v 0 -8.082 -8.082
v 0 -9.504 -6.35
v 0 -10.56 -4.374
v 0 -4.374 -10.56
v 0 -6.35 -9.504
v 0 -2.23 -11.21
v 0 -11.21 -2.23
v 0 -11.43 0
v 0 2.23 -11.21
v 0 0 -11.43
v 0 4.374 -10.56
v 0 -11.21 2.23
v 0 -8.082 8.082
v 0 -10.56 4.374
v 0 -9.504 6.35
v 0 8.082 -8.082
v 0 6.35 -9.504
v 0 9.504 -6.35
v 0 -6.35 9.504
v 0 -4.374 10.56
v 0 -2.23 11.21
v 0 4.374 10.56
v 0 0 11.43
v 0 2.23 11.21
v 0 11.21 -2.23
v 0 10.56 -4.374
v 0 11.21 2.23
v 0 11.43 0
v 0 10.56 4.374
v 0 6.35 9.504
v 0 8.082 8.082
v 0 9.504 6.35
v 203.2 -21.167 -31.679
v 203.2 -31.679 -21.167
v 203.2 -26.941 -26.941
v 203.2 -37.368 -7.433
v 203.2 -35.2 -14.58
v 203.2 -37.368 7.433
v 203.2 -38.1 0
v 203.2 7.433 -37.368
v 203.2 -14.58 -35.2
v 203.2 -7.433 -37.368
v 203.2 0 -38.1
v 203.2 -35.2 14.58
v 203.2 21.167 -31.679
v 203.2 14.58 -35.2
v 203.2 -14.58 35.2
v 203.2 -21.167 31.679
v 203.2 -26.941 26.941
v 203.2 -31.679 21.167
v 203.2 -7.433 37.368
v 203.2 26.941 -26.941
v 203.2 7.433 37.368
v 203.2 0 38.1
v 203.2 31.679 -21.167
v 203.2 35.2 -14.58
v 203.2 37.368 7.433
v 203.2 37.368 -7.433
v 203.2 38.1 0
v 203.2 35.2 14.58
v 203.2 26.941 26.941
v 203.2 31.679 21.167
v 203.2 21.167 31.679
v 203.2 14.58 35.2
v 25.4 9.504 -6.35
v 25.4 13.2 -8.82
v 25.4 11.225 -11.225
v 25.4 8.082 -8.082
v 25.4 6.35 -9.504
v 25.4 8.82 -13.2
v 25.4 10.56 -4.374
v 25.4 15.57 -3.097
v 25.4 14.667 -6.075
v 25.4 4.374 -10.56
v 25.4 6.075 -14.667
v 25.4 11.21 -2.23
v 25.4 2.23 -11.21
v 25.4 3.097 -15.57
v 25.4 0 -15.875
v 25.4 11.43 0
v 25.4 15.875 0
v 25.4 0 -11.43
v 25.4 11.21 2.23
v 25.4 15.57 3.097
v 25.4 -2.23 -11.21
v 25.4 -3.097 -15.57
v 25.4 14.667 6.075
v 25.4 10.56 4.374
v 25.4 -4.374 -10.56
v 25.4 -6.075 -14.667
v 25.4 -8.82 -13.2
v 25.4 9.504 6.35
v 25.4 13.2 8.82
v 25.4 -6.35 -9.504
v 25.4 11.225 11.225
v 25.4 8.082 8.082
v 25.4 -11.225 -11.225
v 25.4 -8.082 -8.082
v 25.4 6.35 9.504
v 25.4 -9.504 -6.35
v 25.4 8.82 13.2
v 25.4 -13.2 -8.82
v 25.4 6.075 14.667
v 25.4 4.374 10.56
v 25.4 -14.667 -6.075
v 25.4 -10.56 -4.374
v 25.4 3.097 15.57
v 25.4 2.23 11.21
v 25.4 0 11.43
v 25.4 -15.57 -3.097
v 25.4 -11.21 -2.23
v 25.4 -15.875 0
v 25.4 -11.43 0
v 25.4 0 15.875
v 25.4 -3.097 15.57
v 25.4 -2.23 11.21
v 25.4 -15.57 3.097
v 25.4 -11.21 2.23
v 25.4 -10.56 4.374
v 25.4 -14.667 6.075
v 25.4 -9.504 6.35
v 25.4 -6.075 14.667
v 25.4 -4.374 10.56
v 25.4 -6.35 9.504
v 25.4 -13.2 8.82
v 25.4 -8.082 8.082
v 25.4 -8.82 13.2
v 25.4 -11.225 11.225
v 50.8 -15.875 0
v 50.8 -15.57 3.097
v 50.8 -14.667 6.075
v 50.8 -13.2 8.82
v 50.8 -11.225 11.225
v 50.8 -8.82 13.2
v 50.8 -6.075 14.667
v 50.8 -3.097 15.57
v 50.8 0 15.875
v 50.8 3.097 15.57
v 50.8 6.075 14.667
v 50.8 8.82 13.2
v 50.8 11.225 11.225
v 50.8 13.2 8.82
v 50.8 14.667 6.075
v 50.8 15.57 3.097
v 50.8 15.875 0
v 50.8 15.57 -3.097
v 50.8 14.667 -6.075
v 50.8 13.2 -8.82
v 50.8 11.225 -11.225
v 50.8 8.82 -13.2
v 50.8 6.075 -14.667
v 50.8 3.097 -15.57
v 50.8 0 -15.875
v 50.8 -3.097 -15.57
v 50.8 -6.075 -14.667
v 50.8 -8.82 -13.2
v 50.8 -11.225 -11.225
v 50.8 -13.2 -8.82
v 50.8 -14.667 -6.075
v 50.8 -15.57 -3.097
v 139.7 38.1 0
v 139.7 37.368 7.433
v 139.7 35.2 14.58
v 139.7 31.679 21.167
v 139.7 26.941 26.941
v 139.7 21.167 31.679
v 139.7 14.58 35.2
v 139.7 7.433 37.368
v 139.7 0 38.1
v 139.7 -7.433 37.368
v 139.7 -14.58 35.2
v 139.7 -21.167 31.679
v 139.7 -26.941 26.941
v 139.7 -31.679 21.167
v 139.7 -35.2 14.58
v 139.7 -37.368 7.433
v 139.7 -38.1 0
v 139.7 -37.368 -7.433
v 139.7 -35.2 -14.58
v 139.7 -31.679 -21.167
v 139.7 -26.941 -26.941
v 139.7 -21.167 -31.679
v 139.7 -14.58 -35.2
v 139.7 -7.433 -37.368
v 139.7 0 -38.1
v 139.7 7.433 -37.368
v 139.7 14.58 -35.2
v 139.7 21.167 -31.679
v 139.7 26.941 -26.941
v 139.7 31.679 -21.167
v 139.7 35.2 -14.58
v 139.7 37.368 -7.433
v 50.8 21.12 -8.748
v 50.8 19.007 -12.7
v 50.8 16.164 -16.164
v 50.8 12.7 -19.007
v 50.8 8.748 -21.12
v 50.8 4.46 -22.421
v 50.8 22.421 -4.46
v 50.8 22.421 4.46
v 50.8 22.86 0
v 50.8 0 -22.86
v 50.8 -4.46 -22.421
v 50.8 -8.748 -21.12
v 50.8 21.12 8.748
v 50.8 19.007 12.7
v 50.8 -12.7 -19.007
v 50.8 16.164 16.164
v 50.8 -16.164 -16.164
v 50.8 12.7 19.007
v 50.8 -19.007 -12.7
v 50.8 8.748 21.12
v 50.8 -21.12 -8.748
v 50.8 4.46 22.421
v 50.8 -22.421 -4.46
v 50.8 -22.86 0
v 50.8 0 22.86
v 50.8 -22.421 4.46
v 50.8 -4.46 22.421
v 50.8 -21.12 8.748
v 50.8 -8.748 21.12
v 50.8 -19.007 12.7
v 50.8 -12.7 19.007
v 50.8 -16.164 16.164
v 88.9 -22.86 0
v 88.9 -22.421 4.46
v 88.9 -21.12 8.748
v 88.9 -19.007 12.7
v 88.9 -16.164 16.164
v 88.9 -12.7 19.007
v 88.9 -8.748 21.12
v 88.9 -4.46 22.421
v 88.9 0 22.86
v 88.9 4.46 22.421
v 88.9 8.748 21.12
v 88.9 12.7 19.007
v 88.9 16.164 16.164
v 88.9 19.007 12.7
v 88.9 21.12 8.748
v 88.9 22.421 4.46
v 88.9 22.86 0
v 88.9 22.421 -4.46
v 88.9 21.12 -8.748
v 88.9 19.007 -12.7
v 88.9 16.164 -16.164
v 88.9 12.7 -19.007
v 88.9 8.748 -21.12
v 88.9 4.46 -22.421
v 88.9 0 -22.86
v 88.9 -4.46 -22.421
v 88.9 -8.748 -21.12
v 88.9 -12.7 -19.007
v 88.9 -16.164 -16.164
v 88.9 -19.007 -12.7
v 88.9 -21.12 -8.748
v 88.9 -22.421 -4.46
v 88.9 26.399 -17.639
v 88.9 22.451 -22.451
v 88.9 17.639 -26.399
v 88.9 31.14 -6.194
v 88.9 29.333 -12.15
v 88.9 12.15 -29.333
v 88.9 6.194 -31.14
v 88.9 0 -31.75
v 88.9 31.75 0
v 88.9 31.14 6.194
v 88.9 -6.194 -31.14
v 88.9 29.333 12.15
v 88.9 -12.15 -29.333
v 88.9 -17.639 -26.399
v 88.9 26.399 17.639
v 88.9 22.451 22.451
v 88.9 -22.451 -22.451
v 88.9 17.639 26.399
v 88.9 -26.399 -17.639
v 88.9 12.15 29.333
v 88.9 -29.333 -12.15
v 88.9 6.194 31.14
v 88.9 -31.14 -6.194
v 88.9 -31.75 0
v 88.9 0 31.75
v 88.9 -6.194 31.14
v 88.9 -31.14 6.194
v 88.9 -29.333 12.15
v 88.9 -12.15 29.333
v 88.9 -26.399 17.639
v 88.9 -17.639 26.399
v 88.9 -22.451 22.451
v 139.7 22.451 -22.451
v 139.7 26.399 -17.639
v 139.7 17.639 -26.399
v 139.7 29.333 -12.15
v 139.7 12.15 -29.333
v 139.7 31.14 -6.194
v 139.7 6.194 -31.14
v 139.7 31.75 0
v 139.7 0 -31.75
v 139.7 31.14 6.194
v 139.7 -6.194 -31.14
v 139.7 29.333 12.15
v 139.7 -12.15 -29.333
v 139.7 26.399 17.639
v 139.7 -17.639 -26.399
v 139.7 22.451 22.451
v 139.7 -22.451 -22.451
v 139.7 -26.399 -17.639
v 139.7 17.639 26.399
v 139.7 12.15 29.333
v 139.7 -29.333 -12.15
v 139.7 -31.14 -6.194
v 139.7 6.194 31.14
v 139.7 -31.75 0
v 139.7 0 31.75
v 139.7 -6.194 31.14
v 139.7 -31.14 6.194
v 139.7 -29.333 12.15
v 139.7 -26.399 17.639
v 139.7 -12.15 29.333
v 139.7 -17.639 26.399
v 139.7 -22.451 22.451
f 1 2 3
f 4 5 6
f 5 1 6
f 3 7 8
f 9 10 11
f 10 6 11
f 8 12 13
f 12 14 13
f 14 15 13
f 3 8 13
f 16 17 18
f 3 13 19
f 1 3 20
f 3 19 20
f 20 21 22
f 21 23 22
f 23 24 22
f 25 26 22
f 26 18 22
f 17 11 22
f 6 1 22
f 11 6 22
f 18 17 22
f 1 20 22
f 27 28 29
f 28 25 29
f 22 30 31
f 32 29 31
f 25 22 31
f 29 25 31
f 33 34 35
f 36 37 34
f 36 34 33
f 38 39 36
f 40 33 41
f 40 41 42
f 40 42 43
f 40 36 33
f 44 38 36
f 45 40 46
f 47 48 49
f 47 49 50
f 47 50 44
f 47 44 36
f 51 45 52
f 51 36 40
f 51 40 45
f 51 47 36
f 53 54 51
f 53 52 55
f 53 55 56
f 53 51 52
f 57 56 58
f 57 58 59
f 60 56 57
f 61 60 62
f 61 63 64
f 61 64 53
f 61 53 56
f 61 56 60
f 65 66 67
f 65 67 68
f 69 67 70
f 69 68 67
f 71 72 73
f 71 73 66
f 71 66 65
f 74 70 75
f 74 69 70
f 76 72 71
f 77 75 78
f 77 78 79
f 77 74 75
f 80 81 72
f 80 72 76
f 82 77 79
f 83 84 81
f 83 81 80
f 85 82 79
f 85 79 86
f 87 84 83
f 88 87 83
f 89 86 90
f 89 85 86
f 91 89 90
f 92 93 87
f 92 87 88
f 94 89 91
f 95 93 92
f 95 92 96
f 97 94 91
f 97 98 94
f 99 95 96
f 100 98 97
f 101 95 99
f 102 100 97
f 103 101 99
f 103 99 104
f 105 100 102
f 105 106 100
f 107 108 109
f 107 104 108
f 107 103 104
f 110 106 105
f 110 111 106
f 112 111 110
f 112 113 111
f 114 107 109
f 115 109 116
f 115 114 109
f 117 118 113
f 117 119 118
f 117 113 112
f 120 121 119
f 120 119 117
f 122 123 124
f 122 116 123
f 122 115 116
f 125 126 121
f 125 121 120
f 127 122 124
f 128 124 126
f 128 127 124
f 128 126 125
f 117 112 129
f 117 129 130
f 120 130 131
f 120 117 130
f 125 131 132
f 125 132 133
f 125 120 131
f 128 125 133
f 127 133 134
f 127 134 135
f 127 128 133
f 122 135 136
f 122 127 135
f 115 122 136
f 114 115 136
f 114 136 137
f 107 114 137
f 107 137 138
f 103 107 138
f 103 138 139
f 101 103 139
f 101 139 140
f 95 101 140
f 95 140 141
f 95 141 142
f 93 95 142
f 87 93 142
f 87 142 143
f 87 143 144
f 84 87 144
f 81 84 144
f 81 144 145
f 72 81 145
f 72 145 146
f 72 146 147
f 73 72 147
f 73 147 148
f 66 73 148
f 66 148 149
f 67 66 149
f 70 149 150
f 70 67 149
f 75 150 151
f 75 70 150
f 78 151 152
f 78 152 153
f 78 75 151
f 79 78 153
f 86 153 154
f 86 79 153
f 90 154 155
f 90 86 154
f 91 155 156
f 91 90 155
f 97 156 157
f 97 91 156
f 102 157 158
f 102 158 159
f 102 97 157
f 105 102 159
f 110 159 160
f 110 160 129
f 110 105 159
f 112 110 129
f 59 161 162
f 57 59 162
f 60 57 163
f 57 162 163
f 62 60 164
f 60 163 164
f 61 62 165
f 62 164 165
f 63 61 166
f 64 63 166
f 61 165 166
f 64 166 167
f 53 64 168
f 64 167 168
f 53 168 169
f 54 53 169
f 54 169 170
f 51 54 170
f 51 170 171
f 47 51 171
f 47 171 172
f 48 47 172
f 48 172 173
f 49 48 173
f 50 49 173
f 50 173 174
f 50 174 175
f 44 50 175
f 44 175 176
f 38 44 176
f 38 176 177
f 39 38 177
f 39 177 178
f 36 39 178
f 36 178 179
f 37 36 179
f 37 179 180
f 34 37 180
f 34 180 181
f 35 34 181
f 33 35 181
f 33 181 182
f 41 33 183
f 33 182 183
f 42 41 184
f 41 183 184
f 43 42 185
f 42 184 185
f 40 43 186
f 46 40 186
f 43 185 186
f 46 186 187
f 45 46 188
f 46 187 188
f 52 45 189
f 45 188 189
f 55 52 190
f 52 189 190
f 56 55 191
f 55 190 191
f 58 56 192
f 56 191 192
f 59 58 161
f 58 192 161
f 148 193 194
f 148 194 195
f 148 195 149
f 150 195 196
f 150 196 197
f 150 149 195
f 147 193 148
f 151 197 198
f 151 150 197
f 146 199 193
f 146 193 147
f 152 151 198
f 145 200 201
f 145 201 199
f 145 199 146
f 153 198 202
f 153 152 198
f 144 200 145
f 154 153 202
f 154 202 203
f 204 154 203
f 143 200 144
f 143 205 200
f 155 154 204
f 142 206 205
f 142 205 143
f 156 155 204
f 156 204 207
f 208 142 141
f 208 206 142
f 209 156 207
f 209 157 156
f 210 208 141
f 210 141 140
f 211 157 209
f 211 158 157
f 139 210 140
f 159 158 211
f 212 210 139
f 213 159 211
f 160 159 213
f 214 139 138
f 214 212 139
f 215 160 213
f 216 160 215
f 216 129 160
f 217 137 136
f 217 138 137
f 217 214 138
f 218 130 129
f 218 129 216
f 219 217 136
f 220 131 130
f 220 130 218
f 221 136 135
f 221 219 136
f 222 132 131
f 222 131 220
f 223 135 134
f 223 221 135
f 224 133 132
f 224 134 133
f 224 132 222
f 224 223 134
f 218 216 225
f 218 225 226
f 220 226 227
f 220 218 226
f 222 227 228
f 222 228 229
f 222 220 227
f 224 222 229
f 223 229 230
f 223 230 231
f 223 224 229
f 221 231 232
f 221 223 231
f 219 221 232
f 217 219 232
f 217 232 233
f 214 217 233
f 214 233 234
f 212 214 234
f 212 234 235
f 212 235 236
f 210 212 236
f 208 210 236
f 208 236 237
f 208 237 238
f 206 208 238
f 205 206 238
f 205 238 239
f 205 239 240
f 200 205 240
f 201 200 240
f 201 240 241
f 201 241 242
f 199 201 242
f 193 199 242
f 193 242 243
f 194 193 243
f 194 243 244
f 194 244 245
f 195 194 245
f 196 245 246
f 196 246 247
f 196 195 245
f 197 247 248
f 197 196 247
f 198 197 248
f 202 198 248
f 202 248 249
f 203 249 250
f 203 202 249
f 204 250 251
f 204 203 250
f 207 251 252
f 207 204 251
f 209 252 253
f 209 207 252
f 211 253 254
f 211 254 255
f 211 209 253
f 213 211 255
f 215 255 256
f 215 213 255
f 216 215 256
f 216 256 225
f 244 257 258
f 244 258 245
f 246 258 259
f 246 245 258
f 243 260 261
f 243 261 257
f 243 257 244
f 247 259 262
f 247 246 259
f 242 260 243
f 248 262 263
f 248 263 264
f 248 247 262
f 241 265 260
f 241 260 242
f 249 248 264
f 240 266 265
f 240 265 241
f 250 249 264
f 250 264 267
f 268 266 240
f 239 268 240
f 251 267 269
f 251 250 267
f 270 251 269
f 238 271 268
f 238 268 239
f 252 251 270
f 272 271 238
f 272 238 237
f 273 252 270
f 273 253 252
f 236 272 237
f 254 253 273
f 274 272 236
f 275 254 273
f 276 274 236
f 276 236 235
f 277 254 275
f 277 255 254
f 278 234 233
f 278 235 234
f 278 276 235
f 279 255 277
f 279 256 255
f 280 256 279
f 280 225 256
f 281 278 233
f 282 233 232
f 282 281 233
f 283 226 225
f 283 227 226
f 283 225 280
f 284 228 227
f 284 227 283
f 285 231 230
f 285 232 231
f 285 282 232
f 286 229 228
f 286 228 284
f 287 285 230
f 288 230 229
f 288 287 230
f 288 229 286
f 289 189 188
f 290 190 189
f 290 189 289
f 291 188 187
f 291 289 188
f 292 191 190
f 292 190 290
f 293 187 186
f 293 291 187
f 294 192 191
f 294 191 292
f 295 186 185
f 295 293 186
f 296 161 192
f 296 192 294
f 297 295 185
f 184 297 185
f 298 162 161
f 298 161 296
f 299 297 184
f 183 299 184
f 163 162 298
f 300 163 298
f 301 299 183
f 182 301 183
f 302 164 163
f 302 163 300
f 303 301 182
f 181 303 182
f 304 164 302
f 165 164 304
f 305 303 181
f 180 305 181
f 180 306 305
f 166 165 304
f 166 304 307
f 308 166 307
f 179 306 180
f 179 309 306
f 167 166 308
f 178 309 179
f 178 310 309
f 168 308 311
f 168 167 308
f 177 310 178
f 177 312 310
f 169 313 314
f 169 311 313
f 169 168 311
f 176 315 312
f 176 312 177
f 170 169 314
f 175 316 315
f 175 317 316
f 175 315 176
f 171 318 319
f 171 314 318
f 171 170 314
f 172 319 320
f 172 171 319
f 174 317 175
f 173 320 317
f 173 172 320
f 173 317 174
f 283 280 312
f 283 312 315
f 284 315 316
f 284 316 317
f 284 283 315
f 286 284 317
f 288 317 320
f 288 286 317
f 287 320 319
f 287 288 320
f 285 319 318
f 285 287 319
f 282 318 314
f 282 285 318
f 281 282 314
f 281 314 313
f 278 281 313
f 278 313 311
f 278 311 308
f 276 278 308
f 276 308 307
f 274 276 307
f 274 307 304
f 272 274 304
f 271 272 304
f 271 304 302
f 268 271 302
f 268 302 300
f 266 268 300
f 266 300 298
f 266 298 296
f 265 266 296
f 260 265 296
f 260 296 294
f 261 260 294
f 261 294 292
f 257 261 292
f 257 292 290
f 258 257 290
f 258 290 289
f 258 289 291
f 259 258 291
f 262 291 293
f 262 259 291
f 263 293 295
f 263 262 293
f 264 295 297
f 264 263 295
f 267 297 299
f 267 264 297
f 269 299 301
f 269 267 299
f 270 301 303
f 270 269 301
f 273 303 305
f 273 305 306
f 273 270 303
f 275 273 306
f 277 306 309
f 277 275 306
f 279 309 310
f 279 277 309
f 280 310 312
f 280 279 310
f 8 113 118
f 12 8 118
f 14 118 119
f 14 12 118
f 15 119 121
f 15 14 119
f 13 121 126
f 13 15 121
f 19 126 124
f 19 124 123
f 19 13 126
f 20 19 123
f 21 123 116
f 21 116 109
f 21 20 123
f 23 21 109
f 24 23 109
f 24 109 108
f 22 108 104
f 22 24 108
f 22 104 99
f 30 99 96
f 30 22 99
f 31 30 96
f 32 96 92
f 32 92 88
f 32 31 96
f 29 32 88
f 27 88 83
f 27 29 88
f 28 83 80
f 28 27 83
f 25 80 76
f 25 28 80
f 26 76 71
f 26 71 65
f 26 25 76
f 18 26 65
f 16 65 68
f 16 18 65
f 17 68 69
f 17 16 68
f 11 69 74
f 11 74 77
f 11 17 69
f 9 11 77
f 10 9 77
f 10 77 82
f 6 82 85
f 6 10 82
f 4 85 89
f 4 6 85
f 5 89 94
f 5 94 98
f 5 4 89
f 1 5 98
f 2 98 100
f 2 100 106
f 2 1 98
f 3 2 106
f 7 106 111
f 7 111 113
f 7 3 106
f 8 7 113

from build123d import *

# Parameters (mm, degrees)
F0_R     = 38.1
F1_DEPTH = 203.2
F2_R     = 38.1
F2_R_2   = 31.75
F3_DEPTH = 139.7
F4_R     = 31.75
F4_R_2   = 22.86
F5_DEPTH = 88.9
F6_R     = 31.75
F6_R_2   = 15.875
F7_DEPTH = 50.8
F8_R     = 15.875
F8_R_2   = 11.43
F9_DEPTH = 25.4


with BuildPart() as f1:
    # F0 (on Right) → F1 (new body)
    with BuildSketch(Plane.YZ):
        Circle(F0_R)
    extrude(amount=F1_DEPTH)

    # F2 (on face) → F3 (cut)
    with BuildSketch(Plane(origin=(0, 0, 0), x_dir=(0, -1, 0), z_dir=(-1, 0, 0))):
        Circle(F2_R)
        Circle(F2_R_2, mode=Mode.SUBTRACT)
    extrude(amount=-F3_DEPTH, mode=Mode.SUBTRACT)

    # F4 (on face) → F5 (cut)
    with BuildSketch(Plane(origin=(0, 0, 0), x_dir=(0, -1, 0), z_dir=(-1, 0, 0))):
        Circle(F4_R)
        Circle(F4_R_2, mode=Mode.SUBTRACT)
    extrude(amount=-F5_DEPTH, mode=Mode.SUBTRACT)

    # F6 (on face) → F7 (cut)
    with BuildSketch(Plane(origin=(0, 0, 0), x_dir=(0, -1, 0), z_dir=(-1, 0, 0))):
        Circle(F6_R)
        Circle(F6_R_2, mode=Mode.SUBTRACT)
    extrude(amount=-F7_DEPTH, mode=Mode.SUBTRACT)

    # F8 (on face) → F9 (cut)
    with BuildSketch(Plane(origin=(0, 0, 0), x_dir=(0, -1, 0), z_dir=(-1, 0, 0))):
        Circle(F8_R)
        Circle(F8_R_2, mode=Mode.SUBTRACT)
    extrude(amount=-F9_DEPTH, mode=Mode.SUBTRACT)


solid = f1.part
